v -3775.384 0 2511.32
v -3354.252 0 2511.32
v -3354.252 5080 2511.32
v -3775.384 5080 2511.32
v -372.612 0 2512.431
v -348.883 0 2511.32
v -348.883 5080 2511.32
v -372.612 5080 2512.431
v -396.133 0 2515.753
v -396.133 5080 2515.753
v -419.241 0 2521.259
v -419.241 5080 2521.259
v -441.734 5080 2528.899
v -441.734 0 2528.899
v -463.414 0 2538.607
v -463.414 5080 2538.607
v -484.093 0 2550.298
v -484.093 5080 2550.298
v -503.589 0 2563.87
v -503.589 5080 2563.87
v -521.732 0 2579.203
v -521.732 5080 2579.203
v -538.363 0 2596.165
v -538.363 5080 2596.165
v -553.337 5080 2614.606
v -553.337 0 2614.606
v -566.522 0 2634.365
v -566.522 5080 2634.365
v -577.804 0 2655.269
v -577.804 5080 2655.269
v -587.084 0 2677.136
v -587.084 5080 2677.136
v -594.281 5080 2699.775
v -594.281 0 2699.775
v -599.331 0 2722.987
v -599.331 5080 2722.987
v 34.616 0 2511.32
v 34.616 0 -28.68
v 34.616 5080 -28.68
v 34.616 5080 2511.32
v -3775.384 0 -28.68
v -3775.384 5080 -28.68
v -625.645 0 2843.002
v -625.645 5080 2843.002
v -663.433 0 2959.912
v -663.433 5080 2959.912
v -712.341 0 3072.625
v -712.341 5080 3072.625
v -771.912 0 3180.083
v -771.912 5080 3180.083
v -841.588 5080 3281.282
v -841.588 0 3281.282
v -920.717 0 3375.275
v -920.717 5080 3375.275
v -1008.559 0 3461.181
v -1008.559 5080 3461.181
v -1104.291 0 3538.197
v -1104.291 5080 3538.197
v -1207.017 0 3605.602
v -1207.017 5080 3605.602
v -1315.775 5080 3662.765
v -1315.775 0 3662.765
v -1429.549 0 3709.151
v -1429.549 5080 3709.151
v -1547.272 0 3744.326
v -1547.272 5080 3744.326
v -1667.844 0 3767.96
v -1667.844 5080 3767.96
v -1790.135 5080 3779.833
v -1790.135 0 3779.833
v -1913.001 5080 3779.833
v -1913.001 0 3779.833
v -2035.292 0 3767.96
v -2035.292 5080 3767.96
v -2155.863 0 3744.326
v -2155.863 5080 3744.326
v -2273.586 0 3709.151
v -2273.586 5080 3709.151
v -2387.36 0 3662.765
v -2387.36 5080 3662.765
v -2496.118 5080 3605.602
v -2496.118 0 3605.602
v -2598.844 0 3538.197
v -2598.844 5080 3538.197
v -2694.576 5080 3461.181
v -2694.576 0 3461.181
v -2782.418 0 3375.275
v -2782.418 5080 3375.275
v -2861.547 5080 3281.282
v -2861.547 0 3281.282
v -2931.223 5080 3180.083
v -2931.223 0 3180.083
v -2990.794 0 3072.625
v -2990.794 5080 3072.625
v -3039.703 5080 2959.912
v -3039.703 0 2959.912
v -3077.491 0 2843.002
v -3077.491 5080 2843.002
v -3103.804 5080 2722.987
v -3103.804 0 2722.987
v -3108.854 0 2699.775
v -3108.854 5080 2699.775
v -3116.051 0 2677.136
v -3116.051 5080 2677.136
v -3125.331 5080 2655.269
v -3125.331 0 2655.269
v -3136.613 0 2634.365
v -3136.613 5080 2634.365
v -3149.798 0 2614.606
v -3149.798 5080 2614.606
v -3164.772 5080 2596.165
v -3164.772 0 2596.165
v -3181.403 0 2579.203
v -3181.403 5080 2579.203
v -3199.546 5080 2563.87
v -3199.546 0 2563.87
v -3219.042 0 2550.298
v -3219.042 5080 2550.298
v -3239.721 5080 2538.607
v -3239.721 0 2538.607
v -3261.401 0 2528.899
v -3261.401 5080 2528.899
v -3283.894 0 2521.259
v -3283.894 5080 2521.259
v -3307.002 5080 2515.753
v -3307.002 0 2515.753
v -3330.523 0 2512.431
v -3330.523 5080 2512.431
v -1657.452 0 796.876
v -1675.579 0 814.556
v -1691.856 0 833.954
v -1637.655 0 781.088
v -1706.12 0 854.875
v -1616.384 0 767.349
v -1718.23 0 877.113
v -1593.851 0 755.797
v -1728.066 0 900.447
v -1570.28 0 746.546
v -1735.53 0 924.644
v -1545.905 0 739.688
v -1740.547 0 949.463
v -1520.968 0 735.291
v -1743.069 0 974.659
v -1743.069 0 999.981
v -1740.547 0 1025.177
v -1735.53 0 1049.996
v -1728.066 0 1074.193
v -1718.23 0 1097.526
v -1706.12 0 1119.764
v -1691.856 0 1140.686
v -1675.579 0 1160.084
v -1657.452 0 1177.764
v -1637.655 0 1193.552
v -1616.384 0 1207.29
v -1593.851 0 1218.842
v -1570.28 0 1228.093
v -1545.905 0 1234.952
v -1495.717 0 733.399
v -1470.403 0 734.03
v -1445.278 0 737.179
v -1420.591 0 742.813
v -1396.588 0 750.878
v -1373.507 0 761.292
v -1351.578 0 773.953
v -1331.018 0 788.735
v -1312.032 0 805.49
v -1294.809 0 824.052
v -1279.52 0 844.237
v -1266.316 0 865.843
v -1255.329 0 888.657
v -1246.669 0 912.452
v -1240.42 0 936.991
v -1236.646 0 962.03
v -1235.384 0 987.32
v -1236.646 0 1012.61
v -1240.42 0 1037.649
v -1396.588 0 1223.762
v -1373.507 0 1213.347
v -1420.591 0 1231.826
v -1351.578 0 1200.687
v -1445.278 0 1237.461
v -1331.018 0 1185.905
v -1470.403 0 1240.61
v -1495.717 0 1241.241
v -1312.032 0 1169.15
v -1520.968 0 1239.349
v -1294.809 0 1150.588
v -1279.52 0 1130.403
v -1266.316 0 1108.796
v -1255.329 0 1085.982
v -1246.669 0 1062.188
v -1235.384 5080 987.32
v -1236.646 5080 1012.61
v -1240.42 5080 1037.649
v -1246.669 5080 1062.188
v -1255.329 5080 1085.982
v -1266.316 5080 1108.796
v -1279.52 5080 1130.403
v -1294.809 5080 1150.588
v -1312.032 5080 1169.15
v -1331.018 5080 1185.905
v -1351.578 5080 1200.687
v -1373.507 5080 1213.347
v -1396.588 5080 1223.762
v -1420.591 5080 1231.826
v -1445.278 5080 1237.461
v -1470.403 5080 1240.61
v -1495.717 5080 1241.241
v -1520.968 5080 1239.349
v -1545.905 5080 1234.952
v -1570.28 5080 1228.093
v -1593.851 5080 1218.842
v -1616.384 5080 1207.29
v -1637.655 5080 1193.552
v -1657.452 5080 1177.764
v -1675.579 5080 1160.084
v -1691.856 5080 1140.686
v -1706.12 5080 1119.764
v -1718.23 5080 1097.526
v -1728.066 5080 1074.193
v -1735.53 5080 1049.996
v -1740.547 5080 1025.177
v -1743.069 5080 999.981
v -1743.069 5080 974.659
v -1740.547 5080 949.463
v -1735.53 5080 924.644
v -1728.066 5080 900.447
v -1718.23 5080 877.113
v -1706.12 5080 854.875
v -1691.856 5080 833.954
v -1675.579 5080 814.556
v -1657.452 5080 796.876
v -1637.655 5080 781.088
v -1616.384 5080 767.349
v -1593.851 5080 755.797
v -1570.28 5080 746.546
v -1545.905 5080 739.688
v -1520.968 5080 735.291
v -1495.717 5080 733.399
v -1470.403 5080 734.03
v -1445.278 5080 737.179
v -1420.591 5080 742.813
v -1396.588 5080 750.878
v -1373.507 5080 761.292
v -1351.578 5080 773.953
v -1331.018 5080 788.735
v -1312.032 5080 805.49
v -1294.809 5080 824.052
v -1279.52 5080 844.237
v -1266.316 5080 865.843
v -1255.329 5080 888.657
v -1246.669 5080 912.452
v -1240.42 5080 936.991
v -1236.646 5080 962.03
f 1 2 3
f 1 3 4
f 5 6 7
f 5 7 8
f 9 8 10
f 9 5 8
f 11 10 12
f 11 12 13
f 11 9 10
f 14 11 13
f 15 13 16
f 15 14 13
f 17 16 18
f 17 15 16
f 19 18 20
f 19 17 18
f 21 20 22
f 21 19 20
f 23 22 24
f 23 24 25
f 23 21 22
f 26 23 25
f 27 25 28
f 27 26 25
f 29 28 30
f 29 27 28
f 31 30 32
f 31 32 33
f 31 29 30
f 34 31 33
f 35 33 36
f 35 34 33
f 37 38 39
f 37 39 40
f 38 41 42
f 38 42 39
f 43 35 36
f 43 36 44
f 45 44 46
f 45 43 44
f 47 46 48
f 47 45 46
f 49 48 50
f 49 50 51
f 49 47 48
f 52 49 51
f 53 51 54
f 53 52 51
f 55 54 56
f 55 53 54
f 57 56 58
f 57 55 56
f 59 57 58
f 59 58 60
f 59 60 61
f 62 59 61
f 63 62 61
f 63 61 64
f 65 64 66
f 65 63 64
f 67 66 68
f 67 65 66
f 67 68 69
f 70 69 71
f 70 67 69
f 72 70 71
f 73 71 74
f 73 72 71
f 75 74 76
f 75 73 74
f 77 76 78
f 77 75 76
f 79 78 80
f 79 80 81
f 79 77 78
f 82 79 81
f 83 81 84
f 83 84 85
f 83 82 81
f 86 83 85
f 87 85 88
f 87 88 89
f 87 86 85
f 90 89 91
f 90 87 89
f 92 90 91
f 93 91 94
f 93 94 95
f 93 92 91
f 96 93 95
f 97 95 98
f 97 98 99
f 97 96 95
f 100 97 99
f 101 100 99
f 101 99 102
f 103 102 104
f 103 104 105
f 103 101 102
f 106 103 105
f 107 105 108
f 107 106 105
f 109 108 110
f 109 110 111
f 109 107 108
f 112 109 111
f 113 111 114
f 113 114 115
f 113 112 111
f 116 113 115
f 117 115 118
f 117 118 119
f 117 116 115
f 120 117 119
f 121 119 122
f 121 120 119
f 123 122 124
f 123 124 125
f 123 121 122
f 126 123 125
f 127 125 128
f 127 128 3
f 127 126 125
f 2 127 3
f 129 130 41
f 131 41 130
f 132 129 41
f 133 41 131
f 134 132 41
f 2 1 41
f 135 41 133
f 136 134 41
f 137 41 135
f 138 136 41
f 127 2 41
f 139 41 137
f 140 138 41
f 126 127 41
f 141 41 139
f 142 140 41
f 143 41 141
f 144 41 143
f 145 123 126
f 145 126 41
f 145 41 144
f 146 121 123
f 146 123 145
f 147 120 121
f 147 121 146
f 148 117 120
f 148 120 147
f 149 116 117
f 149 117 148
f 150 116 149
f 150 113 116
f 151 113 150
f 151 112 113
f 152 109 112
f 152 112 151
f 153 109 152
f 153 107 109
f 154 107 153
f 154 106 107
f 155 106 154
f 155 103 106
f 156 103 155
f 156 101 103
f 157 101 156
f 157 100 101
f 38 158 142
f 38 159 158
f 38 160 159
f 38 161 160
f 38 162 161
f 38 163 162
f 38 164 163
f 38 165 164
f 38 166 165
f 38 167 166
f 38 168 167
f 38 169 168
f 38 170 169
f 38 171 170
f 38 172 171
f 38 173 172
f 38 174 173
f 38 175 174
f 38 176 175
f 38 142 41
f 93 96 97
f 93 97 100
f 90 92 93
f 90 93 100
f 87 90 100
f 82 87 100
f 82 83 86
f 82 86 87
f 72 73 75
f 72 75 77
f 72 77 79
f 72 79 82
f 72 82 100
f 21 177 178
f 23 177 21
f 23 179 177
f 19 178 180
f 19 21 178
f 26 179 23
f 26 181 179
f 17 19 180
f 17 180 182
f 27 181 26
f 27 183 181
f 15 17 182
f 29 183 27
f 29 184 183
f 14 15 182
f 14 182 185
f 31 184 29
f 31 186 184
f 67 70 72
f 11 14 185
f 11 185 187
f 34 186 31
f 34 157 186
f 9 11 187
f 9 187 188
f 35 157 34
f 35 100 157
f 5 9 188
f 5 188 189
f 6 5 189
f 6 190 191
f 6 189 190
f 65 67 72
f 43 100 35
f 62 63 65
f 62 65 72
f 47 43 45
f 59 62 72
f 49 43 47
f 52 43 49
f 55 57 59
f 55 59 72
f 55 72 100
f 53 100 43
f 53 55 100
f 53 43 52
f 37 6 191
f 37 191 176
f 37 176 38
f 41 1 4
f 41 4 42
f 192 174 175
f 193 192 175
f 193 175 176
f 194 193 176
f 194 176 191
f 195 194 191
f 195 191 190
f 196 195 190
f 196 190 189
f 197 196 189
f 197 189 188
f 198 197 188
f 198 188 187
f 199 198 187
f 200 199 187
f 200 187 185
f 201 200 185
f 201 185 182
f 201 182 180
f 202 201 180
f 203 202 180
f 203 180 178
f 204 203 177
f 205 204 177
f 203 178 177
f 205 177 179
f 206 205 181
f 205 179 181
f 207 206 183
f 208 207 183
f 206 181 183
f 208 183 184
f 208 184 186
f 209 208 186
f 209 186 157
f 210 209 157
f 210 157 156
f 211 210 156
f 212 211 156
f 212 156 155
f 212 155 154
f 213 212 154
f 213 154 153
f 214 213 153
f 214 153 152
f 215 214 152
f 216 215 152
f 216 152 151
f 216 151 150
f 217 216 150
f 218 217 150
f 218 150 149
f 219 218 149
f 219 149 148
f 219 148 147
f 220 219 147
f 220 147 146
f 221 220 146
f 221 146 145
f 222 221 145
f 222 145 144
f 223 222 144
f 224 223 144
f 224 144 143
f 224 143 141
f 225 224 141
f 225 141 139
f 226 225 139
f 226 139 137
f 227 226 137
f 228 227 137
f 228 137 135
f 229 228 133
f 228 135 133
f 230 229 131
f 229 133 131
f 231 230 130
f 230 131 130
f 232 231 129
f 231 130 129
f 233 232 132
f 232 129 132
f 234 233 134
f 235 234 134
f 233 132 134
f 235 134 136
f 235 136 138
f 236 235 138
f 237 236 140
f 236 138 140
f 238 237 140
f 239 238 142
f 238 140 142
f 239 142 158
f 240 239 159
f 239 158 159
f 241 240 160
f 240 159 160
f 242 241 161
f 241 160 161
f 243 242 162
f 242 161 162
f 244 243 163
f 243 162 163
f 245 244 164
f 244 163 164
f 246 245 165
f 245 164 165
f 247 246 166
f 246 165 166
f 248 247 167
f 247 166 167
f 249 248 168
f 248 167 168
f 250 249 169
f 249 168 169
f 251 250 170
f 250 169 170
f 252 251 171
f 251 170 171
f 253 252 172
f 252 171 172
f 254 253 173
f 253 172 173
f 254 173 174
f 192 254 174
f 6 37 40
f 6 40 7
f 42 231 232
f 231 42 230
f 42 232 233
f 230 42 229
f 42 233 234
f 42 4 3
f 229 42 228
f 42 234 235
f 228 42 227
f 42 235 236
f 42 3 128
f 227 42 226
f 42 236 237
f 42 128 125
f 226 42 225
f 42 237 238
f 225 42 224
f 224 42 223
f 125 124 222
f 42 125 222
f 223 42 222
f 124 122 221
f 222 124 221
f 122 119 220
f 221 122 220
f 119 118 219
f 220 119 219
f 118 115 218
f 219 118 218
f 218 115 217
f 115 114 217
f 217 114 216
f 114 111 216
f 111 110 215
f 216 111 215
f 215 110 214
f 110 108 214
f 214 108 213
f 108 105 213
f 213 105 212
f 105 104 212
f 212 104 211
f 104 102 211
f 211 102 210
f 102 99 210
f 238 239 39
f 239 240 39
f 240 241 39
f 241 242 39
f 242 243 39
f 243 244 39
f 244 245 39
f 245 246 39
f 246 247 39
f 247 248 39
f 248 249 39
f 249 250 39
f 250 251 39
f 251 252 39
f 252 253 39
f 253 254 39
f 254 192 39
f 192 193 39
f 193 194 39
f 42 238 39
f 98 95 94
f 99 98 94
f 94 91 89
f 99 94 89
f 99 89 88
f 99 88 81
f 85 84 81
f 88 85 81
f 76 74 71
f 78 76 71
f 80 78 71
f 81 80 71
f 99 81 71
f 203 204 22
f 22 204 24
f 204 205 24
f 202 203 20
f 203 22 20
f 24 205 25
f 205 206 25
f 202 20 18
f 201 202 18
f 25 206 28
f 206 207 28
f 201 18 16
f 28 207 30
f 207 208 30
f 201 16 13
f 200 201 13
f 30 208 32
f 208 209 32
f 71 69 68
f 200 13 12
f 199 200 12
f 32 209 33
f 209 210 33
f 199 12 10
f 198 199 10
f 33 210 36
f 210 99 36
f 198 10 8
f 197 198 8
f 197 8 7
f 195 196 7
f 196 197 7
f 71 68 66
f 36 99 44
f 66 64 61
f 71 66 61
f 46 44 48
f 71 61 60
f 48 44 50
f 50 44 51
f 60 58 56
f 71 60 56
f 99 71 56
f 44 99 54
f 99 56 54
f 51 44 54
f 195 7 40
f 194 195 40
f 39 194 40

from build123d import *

# Parameters (mm, degrees)
F1_DEPTH = 5080
F2_R     = 254
F3_DEPTH = 7620


with BuildPart() as f1:
    # F0 (on Front) → F1 (new body)
    with BuildSketch(Plane.XZ):
        with BuildLine():
            Line((-3354.25178, 2511.319927), (-3775.384267, 2511.319927))
            Line((-3775.384267, 2511.319927), (-3775.384267, -28.680073))
            Line((-3775.384267, -28.680073), (34.615733, -28.680073))
            Line((34.615733, -28.680073), (34.615733, 2511.319927))
            Line((34.615733, 2511.319927), (-348.88325, 2511.319927))
            ThreePointArc((-348.88325, 2511.319927), (-512.839545, 2571.324222), (-599.330627, 2722.986594))
            ThreePointArc((-599.330627, 2722.986594), (-1851.567515, 3781.319927), (-3103.804402, 2722.986594))
            ThreePointArc((-3103.804402, 2722.986594), (-3190.295485, 2571.324222), (-3354.25178, 2511.319927))
        make_face()
    extrude(amount=-F1_DEPTH)

    # F2 (on face) → F3 (intersect)
    with BuildSketch(Plane.XZ):
        with BuildLine():
            ThreePointArc((-599.330627, 2722.986594), (-1851.567515, 3781.319927), (-3103.804402, 2722.986594))
            ThreePointArc((-3103.804402, 2722.986594), (-3190.295485, 2571.324222), (-3354.25178, 2511.319927))
            Line((-3354.25178, 2511.319927), (-3775.384267, 2511.319927))
            Line((-3775.384267, 2511.319927), (-3775.384267, -28.680073))
            Line((-3775.384267, -28.680073), (34.615733, -28.680073))
            Line((34.615733, -28.680073), (34.615733, 2511.319927))
            Line((34.615733, 2511.319927), (-348.88325, 2511.319927))
            ThreePointArc((-348.88325, 2511.319927), (-512.839545, 2571.324222), (-599.330627, 2722.986594))
        make_face()
        with Locations((-1489.384267, 987.319927)):
            Circle(F2_R, mode=Mode.SUBTRACT)
    extrude(amount=-F3_DEPTH, mode=Mode.INTERSECT)


solid = f1.part
